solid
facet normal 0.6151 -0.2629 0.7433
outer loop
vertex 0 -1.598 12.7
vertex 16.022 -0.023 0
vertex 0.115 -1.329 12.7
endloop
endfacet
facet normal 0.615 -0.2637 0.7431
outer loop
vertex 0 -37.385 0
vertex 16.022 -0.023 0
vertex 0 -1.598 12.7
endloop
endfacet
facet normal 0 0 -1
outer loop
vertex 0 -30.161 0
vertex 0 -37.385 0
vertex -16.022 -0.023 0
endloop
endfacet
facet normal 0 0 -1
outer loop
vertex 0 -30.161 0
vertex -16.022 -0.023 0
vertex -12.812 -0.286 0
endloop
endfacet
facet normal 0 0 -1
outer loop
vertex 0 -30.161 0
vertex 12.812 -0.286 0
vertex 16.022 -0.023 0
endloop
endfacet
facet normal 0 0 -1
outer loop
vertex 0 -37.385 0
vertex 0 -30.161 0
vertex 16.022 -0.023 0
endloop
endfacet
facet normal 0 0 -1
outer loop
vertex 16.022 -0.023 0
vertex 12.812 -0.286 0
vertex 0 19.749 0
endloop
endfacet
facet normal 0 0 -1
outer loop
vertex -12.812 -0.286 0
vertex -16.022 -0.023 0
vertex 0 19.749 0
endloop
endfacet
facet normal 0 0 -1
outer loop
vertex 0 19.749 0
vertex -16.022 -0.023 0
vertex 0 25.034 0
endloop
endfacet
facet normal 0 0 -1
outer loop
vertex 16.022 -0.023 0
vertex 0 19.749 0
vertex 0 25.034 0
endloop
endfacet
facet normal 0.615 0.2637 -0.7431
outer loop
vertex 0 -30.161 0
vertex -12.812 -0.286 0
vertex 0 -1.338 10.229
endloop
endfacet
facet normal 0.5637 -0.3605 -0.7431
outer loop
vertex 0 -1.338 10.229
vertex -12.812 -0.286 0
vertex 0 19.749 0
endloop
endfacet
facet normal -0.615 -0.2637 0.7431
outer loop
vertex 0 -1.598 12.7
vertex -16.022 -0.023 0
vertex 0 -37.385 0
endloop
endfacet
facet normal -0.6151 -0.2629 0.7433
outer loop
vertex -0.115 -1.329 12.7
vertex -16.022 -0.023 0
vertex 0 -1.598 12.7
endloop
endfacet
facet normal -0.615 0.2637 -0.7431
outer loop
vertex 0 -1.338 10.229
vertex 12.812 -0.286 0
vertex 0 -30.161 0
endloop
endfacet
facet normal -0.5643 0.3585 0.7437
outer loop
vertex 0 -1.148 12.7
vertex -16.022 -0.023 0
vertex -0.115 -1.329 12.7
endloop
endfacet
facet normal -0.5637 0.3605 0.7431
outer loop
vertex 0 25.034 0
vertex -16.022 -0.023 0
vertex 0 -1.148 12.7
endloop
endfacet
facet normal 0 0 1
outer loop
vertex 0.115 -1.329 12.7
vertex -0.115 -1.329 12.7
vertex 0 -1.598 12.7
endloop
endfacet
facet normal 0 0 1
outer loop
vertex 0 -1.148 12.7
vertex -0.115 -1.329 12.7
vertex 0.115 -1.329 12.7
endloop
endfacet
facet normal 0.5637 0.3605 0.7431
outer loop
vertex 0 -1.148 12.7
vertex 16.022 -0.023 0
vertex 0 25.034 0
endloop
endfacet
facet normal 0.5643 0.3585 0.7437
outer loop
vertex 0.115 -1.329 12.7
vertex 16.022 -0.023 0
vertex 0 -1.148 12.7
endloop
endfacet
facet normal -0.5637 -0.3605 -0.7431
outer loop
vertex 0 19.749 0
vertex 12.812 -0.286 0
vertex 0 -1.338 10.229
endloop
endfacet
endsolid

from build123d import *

# Parameters (mm, degrees)
F1_DEPTH    = 12.7
F2_T1_DEPTH = 115.269941864
F2_T3_DEPTH = 104.1696304448
F2_T5_DEPTH = 104.1696304448
F2_T7_DEPTH = 115.269941864
F3_T        = -1.905


# Not quite as in the source:
# - a fillet or chamfer that OpenCascade refuses, or shapes differently, is made with other operations: its cross-section is extruded or revolved along the edge and cut away or added


with BuildPart() as f1:
    # F0 (on Top) → F1 (new body)
    with BuildSketch(Plane.XY):
        Polygon((16.3001076085, 0), (0, 25.4906731501), (-16.3001076085, 0), (0, -38.0093268499), align=None)
    extrude(amount=F1_DEPTH)

    # F2: chamfer of 14.351 x 12.9216984397 on 4 edges, made by hand

    # F2_s2 → F2_t1 (cut)
    with BuildSketch(Plane(origin=(-28.3337655113, -66.0699536514, 0), x_dir=(0, 0, 1), z_dir=(0.3941316562, 0.9190539906, 0))):
        Polygon((-0.2216984397, 14.980678944), (12.7, 0.629678944), (12.7, 14.980678944), align=None)
    extrude(amount=F2_T1_DEPTH, mode=Mode.SUBTRACT)

    # F2_s4 → F2_t3 (cut)
    with BuildSketch(Plane(origin=(24.6401842719, -38.5331740573, 0), x_dir=(0, 0, 1), z_dir=(-0.5387272021, 0.8424802679, 0))):
        Polygon((-0.2216984397, 13.7325190245), (12.7, -0.6184809755), (12.7, 13.7325190245), align=None)
    extrude(amount=F2_T3_DEPTH, mode=Mode.SUBTRACT)

    # F2_s6 → F2_t5 (cut)
    with BuildSketch(Plane(origin=(31.4788292763, 49.227684105, 0), x_dir=(0, 0, 1), z_dir=(-0.5387272021, -0.8424802679, 0))):
        Polygon((-0.2216984397, 13.7325190245), (12.7, -0.6184809755), (12.7, 13.7325190245), align=None)
    extrude(amount=F2_T5_DEPTH, mode=Mode.SUBTRACT)

    # F2_s8 → F2_t7 (cut)
    with BuildSketch(Plane(origin=(-17.0977675905, 39.8693464092, 0), x_dir=(0, 0, 1), z_dir=(0.3941316562, -0.9190539906, 0))):
        Polygon((-0.2216984397, 14.980678944), (12.7, 0.629678944), (12.7, 14.980678944), align=None)
    extrude(amount=F2_T7_DEPTH, mode=Mode.SUBTRACT)

    # F3
    f3_openings = [f1.faces().sort_by_distance(p)[0] for p in [
        (0, -4.124591, 0),
    ]]
    offset(amount=F3_T, openings=f3_openings)


solid = f1.part
